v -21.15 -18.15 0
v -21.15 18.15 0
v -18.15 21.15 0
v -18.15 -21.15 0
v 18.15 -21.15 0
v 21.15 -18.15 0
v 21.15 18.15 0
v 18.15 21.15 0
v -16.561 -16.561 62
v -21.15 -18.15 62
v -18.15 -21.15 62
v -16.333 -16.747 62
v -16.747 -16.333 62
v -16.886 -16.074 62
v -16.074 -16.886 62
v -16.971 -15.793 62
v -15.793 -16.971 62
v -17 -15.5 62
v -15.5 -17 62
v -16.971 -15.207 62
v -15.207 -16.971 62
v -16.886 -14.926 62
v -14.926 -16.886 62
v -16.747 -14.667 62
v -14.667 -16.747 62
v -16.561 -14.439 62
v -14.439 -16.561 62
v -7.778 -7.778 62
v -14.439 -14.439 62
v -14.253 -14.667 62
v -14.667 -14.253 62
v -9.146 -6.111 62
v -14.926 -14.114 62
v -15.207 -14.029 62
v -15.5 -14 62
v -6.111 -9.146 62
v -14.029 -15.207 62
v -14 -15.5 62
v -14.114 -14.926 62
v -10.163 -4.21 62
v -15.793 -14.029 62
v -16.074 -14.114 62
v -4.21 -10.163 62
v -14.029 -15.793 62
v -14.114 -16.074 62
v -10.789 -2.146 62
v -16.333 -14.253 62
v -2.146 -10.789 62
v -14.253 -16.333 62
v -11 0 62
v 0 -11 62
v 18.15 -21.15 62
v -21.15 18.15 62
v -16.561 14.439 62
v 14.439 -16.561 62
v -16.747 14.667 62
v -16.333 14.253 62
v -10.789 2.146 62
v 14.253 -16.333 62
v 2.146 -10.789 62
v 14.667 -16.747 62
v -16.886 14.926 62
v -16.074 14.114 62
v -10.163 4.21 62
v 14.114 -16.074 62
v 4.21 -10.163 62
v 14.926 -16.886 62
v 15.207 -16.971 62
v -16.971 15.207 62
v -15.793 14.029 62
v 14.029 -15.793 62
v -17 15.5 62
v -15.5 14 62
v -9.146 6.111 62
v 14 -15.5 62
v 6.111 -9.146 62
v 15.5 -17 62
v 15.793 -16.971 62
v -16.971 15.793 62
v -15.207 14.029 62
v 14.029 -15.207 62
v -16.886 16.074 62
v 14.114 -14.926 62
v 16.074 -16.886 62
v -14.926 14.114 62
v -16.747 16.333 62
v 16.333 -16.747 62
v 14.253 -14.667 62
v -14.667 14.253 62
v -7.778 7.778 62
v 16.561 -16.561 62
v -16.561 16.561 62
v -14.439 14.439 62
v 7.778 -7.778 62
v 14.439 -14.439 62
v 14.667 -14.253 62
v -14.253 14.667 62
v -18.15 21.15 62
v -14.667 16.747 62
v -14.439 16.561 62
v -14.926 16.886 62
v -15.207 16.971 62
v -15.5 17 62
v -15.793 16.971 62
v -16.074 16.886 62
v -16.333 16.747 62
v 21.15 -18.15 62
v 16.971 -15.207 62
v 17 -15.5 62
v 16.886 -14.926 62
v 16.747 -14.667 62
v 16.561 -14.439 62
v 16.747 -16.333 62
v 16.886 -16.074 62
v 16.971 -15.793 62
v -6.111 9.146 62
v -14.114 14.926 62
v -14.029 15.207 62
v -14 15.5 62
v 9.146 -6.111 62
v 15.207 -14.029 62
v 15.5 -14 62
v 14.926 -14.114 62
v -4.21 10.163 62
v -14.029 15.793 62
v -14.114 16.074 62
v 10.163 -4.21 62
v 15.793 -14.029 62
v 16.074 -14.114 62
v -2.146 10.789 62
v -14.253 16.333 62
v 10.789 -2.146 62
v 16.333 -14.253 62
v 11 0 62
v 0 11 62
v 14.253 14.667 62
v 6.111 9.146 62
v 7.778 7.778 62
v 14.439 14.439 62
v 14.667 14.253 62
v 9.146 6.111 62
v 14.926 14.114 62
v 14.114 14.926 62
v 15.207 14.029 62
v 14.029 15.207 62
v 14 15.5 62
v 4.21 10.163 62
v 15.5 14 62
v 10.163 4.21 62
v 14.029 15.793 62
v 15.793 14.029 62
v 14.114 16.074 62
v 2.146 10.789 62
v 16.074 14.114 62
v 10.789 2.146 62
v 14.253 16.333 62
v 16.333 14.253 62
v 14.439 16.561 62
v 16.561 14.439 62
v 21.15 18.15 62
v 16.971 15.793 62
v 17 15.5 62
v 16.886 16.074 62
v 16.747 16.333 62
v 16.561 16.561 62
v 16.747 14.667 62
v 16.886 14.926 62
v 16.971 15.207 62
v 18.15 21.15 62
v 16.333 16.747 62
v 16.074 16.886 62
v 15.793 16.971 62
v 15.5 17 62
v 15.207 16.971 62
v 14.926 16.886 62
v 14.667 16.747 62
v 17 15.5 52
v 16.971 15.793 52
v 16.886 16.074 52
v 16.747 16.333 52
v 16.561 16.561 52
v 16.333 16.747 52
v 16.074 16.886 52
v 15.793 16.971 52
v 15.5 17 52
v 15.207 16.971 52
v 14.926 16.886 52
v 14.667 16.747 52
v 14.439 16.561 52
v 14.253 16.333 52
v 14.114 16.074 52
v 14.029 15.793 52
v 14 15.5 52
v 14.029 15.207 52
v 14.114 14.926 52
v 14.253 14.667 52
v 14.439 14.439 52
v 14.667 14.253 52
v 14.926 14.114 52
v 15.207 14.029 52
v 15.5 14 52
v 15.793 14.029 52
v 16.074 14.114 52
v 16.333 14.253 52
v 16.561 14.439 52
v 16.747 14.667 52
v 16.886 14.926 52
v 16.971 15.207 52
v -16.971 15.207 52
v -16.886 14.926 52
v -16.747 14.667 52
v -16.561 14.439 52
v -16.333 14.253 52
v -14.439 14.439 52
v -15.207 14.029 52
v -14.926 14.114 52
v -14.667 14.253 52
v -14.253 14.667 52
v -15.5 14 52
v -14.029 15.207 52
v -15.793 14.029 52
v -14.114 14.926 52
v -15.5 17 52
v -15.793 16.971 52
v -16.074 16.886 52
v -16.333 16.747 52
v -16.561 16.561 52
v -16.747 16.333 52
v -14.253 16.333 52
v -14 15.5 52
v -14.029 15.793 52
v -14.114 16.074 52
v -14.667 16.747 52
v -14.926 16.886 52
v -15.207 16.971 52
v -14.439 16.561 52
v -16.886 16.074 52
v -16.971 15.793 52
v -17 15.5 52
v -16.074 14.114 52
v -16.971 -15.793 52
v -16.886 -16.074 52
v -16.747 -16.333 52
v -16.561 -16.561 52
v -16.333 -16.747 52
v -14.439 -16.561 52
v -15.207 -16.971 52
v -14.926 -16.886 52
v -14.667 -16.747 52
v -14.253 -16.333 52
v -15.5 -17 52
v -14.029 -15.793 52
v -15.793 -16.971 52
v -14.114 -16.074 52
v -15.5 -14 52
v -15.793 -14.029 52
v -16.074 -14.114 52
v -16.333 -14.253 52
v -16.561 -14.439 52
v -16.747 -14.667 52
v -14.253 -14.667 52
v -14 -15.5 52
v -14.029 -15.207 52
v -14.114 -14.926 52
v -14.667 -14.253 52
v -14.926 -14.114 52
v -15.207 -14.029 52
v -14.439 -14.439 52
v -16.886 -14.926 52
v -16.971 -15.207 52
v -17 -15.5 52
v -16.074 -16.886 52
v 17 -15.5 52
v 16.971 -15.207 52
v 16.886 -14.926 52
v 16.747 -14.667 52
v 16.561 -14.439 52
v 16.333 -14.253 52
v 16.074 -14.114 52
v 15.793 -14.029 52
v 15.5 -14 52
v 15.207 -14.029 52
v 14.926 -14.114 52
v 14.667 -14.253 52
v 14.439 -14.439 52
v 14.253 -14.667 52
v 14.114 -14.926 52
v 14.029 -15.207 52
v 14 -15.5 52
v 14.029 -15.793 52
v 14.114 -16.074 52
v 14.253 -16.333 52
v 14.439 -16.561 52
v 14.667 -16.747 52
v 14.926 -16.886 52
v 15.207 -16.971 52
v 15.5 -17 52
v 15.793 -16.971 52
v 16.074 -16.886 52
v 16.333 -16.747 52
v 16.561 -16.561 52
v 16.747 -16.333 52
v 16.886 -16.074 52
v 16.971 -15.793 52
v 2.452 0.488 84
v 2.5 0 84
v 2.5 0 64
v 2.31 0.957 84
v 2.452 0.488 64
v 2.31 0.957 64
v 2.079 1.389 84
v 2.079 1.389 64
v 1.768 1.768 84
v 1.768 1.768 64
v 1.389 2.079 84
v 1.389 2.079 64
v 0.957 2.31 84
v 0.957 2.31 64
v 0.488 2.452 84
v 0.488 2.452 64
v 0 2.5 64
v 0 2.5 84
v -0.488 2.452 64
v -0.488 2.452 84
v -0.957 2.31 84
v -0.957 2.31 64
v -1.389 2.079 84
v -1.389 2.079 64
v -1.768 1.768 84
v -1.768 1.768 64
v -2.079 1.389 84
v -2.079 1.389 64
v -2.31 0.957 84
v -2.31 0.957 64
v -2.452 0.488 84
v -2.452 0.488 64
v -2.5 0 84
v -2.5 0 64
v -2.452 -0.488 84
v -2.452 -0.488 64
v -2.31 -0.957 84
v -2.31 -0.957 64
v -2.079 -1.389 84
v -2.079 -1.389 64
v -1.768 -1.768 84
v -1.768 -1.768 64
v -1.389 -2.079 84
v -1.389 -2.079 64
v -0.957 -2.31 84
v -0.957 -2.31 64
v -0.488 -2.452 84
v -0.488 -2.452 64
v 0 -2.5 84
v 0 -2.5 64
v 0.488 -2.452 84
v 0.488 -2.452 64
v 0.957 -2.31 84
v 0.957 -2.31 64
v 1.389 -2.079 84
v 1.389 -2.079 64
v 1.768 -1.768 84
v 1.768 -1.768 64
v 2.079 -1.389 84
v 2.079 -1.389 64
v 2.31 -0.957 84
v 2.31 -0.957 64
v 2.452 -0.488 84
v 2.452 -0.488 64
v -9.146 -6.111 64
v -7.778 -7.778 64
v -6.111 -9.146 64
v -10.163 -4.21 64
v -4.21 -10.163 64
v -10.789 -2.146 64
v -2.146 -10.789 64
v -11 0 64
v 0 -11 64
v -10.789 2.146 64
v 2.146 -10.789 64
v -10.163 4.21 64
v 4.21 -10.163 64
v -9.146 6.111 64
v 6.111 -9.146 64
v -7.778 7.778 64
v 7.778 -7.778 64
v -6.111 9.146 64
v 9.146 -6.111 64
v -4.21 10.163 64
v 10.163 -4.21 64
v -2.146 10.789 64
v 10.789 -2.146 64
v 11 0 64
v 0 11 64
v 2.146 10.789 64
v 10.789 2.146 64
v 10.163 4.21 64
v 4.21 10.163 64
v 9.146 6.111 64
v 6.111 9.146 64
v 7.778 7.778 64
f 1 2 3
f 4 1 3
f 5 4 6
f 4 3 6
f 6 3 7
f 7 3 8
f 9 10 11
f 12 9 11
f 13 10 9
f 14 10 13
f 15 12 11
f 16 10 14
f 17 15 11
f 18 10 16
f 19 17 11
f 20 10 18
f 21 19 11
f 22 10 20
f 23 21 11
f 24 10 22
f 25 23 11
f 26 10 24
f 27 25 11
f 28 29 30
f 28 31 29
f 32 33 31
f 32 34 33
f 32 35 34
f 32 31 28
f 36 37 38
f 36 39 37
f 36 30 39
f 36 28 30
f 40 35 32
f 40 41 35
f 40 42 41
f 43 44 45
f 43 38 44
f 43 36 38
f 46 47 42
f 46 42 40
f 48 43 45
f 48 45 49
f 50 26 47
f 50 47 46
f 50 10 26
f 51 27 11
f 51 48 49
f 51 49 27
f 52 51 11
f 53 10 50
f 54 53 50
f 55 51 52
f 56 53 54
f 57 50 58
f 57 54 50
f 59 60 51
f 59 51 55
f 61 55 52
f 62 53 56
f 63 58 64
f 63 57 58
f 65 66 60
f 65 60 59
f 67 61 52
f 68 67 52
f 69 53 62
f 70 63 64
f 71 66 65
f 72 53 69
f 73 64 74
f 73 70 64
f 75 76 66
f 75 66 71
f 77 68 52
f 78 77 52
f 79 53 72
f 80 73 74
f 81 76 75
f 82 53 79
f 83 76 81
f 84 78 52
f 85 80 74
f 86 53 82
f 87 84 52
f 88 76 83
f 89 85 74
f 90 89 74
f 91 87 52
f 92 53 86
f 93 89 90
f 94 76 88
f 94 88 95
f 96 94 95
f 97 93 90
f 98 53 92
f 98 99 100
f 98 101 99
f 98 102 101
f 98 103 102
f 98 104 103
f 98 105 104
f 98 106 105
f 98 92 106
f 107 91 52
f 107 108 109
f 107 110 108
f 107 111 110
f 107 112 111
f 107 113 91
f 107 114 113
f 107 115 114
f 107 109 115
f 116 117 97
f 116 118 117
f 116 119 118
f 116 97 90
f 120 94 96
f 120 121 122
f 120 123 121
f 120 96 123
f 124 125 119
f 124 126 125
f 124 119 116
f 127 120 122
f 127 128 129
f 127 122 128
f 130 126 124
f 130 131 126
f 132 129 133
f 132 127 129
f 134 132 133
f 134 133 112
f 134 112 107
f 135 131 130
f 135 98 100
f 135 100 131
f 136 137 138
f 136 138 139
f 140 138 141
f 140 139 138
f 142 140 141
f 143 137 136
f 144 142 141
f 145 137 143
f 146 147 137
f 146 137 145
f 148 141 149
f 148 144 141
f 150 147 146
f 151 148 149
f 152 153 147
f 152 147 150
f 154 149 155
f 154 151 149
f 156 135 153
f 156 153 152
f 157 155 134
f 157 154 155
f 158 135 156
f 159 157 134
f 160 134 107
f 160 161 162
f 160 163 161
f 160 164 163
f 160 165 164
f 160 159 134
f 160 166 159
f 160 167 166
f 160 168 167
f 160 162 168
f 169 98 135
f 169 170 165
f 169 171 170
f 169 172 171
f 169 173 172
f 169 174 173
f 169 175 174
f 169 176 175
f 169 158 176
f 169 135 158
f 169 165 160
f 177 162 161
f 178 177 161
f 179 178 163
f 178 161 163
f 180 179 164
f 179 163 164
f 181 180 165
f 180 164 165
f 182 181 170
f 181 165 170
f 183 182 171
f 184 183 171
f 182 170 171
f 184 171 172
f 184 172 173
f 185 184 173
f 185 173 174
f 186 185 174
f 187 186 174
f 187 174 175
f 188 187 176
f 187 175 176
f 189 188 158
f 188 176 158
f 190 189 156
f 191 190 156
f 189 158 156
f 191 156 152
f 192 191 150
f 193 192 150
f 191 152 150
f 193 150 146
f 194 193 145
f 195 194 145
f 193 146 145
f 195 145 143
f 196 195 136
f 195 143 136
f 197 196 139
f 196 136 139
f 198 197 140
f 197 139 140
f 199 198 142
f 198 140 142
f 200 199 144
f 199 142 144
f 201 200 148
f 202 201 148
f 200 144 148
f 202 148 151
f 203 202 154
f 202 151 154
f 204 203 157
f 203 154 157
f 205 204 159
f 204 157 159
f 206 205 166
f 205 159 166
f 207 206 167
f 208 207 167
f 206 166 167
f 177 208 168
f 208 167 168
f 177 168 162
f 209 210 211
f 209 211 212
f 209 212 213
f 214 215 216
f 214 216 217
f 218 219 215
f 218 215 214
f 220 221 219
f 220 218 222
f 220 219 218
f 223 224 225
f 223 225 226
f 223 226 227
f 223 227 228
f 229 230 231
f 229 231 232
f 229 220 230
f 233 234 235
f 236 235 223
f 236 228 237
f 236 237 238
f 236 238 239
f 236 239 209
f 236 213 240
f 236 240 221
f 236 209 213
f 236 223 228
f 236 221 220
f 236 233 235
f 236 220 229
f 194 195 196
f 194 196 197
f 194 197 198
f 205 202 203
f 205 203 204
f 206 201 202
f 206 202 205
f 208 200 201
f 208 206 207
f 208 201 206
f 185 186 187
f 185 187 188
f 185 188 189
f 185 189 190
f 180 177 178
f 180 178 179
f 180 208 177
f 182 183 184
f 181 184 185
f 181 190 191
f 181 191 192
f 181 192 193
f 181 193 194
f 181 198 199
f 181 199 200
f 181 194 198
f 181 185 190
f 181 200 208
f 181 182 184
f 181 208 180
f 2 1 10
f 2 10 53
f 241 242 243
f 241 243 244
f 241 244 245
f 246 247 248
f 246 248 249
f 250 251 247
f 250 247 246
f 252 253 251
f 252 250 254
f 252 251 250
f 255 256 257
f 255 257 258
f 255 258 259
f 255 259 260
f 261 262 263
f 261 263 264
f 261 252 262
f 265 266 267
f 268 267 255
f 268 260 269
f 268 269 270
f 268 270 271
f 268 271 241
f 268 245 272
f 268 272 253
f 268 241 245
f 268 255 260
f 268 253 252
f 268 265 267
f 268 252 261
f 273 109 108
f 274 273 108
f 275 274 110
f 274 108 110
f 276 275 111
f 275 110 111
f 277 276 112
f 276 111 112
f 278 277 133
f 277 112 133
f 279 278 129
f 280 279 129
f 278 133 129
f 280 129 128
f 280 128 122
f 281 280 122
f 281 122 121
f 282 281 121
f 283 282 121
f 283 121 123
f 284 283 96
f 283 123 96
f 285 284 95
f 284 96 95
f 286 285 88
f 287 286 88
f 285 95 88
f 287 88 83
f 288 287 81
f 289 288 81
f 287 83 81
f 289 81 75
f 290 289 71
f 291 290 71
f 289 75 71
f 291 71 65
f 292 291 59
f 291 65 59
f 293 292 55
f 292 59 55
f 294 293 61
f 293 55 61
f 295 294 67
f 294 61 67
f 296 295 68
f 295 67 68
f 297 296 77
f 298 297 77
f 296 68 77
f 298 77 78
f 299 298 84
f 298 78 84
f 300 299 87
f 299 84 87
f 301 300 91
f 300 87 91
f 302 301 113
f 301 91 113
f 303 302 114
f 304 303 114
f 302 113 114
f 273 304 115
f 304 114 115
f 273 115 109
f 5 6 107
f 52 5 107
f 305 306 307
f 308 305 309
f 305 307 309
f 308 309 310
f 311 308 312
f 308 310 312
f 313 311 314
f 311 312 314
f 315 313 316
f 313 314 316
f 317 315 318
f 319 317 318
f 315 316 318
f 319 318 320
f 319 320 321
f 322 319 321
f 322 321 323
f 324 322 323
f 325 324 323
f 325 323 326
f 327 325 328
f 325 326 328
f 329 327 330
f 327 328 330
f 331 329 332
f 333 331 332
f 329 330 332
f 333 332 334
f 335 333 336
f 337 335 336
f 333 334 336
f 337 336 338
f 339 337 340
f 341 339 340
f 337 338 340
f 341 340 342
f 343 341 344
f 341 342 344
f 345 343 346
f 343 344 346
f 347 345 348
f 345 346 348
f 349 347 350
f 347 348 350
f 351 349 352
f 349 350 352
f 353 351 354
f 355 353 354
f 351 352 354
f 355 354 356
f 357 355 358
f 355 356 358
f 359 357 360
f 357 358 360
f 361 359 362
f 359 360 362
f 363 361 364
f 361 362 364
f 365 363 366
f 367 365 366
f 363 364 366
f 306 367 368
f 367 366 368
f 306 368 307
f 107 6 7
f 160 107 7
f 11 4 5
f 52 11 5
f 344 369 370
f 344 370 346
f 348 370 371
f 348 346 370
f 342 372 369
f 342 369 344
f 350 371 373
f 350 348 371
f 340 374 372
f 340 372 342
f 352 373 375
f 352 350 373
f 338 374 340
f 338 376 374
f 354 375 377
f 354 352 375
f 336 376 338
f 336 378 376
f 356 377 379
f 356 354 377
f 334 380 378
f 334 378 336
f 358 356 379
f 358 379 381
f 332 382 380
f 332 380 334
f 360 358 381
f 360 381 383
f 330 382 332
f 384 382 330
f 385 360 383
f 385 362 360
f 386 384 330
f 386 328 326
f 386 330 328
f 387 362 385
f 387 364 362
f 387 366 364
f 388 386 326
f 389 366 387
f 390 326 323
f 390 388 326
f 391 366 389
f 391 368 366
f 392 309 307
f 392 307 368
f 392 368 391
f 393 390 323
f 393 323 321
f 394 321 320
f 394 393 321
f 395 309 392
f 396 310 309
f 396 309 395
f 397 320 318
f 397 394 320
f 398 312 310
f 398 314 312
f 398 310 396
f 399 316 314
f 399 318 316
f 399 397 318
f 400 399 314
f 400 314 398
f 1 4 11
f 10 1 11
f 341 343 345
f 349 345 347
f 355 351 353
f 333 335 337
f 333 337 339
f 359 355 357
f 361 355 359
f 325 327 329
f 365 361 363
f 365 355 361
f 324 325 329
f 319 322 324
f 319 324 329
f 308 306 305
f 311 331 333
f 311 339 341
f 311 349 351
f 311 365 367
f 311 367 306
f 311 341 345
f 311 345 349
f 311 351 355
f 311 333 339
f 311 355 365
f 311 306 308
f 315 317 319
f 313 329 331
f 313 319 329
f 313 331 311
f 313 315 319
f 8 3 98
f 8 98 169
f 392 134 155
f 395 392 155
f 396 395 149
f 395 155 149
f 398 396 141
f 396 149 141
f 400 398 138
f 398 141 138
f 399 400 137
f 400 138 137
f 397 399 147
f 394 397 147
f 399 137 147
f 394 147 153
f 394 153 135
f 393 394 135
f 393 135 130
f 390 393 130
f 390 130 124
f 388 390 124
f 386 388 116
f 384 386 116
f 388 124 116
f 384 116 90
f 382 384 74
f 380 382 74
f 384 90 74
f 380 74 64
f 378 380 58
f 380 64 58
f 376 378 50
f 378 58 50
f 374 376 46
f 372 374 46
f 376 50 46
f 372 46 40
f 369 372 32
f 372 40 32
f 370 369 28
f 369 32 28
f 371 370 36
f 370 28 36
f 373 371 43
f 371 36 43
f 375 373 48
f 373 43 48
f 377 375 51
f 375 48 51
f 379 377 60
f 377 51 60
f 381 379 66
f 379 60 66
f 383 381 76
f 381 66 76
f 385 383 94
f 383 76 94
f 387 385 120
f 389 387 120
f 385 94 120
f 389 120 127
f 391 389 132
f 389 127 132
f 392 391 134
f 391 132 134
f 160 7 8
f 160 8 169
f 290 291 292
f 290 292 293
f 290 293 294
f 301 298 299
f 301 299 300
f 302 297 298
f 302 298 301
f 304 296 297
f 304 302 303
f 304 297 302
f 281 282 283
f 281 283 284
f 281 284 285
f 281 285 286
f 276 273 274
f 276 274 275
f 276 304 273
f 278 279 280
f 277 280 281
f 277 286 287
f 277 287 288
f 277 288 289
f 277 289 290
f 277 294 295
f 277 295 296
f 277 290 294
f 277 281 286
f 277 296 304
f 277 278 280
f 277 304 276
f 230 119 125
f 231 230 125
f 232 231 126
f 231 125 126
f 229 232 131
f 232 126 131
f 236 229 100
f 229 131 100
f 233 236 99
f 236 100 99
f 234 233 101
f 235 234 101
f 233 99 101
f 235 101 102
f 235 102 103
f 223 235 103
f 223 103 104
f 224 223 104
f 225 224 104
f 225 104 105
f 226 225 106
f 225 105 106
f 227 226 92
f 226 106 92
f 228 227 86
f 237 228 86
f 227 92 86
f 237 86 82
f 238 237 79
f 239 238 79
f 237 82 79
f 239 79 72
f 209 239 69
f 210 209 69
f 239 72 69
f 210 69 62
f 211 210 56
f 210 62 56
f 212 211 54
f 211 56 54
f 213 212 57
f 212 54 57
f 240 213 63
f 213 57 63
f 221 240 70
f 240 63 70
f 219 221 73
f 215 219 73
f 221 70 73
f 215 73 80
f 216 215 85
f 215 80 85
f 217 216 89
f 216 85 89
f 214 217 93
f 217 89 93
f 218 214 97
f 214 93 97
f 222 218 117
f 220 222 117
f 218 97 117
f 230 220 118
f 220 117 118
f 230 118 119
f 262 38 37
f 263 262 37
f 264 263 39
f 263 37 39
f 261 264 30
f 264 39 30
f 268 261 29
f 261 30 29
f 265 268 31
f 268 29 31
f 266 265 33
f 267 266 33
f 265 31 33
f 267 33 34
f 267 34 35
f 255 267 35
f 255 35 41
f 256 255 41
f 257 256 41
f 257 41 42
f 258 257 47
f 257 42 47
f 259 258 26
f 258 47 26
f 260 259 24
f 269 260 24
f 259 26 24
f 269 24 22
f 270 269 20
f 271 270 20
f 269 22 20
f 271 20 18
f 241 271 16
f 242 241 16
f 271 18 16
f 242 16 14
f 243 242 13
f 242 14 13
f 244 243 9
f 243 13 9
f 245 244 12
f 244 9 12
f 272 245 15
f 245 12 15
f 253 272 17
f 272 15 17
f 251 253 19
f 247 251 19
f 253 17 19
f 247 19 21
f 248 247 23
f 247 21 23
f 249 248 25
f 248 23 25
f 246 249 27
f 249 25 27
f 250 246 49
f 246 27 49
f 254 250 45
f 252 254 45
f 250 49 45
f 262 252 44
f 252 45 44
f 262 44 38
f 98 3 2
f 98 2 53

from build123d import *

# Parameters (mm, degrees)
SKETCH_1_W          = 42.3
SKETCH_1_H          = 42.3
EXTRUDE_1_DEPTH     = 62
SKETCH_2_R          = 11
EXTRUDE_2_DEPTH     = 2
SKETCH_3_R          = 2.5
EXTRUDE_3_DEPTH     = 20
CHAMFER_1_SIZE      = 3
SKETCH_4_R          = 1.5
CUT_EXTRUDE_1_DEPTH = 10


with BuildPart() as part:
    # 草图1 → 凸台-拉伸1 (new body)
    with BuildSketch(Plane.XY):
        Rectangle(SKETCH_1_W, SKETCH_1_H)
    extrude(amount=EXTRUDE_1_DEPTH)

    # 草图2 → 凸台-拉伸2 (add)
    with BuildSketch(Plane.XY.offset(62)):
        Circle(SKETCH_2_R)
    extrude(amount=EXTRUDE_2_DEPTH)

    # 草图3 → 凸台-拉伸3 (add)
    with BuildSketch(Plane.XY.offset(64)):
        Circle(SKETCH_3_R)
    extrude(amount=EXTRUDE_3_DEPTH)

    # 倒角1
    chamfer_1_edges = [part.edges().sort_by_distance(p)[0] for p in [
        (21.15, -21.15, 31),
        (-21.15, -21.15, 31),
        (-21.15, 21.15, 31),
        (21.15, 21.15, 31),
    ]]
    chamfer(chamfer_1_edges, length=CHAMFER_1_SIZE)

    # 草图4 → 切除-拉伸1 (cut)
    with BuildSketch(Plane.XY.offset(62)):
        with Locations((15.5, -15.5)):
            Circle(SKETCH_4_R)
        with Locations((-15.5, -15.5)):
            Circle(SKETCH_4_R)
        with Locations((15.5, 15.5)):
            Circle(SKETCH_4_R)
        with Locations((-15.5, 15.5)):
            Circle(SKETCH_4_R)
    extrude(amount=-CUT_EXTRUDE_1_DEPTH, mode=Mode.SUBTRACT)


solid = part.part
